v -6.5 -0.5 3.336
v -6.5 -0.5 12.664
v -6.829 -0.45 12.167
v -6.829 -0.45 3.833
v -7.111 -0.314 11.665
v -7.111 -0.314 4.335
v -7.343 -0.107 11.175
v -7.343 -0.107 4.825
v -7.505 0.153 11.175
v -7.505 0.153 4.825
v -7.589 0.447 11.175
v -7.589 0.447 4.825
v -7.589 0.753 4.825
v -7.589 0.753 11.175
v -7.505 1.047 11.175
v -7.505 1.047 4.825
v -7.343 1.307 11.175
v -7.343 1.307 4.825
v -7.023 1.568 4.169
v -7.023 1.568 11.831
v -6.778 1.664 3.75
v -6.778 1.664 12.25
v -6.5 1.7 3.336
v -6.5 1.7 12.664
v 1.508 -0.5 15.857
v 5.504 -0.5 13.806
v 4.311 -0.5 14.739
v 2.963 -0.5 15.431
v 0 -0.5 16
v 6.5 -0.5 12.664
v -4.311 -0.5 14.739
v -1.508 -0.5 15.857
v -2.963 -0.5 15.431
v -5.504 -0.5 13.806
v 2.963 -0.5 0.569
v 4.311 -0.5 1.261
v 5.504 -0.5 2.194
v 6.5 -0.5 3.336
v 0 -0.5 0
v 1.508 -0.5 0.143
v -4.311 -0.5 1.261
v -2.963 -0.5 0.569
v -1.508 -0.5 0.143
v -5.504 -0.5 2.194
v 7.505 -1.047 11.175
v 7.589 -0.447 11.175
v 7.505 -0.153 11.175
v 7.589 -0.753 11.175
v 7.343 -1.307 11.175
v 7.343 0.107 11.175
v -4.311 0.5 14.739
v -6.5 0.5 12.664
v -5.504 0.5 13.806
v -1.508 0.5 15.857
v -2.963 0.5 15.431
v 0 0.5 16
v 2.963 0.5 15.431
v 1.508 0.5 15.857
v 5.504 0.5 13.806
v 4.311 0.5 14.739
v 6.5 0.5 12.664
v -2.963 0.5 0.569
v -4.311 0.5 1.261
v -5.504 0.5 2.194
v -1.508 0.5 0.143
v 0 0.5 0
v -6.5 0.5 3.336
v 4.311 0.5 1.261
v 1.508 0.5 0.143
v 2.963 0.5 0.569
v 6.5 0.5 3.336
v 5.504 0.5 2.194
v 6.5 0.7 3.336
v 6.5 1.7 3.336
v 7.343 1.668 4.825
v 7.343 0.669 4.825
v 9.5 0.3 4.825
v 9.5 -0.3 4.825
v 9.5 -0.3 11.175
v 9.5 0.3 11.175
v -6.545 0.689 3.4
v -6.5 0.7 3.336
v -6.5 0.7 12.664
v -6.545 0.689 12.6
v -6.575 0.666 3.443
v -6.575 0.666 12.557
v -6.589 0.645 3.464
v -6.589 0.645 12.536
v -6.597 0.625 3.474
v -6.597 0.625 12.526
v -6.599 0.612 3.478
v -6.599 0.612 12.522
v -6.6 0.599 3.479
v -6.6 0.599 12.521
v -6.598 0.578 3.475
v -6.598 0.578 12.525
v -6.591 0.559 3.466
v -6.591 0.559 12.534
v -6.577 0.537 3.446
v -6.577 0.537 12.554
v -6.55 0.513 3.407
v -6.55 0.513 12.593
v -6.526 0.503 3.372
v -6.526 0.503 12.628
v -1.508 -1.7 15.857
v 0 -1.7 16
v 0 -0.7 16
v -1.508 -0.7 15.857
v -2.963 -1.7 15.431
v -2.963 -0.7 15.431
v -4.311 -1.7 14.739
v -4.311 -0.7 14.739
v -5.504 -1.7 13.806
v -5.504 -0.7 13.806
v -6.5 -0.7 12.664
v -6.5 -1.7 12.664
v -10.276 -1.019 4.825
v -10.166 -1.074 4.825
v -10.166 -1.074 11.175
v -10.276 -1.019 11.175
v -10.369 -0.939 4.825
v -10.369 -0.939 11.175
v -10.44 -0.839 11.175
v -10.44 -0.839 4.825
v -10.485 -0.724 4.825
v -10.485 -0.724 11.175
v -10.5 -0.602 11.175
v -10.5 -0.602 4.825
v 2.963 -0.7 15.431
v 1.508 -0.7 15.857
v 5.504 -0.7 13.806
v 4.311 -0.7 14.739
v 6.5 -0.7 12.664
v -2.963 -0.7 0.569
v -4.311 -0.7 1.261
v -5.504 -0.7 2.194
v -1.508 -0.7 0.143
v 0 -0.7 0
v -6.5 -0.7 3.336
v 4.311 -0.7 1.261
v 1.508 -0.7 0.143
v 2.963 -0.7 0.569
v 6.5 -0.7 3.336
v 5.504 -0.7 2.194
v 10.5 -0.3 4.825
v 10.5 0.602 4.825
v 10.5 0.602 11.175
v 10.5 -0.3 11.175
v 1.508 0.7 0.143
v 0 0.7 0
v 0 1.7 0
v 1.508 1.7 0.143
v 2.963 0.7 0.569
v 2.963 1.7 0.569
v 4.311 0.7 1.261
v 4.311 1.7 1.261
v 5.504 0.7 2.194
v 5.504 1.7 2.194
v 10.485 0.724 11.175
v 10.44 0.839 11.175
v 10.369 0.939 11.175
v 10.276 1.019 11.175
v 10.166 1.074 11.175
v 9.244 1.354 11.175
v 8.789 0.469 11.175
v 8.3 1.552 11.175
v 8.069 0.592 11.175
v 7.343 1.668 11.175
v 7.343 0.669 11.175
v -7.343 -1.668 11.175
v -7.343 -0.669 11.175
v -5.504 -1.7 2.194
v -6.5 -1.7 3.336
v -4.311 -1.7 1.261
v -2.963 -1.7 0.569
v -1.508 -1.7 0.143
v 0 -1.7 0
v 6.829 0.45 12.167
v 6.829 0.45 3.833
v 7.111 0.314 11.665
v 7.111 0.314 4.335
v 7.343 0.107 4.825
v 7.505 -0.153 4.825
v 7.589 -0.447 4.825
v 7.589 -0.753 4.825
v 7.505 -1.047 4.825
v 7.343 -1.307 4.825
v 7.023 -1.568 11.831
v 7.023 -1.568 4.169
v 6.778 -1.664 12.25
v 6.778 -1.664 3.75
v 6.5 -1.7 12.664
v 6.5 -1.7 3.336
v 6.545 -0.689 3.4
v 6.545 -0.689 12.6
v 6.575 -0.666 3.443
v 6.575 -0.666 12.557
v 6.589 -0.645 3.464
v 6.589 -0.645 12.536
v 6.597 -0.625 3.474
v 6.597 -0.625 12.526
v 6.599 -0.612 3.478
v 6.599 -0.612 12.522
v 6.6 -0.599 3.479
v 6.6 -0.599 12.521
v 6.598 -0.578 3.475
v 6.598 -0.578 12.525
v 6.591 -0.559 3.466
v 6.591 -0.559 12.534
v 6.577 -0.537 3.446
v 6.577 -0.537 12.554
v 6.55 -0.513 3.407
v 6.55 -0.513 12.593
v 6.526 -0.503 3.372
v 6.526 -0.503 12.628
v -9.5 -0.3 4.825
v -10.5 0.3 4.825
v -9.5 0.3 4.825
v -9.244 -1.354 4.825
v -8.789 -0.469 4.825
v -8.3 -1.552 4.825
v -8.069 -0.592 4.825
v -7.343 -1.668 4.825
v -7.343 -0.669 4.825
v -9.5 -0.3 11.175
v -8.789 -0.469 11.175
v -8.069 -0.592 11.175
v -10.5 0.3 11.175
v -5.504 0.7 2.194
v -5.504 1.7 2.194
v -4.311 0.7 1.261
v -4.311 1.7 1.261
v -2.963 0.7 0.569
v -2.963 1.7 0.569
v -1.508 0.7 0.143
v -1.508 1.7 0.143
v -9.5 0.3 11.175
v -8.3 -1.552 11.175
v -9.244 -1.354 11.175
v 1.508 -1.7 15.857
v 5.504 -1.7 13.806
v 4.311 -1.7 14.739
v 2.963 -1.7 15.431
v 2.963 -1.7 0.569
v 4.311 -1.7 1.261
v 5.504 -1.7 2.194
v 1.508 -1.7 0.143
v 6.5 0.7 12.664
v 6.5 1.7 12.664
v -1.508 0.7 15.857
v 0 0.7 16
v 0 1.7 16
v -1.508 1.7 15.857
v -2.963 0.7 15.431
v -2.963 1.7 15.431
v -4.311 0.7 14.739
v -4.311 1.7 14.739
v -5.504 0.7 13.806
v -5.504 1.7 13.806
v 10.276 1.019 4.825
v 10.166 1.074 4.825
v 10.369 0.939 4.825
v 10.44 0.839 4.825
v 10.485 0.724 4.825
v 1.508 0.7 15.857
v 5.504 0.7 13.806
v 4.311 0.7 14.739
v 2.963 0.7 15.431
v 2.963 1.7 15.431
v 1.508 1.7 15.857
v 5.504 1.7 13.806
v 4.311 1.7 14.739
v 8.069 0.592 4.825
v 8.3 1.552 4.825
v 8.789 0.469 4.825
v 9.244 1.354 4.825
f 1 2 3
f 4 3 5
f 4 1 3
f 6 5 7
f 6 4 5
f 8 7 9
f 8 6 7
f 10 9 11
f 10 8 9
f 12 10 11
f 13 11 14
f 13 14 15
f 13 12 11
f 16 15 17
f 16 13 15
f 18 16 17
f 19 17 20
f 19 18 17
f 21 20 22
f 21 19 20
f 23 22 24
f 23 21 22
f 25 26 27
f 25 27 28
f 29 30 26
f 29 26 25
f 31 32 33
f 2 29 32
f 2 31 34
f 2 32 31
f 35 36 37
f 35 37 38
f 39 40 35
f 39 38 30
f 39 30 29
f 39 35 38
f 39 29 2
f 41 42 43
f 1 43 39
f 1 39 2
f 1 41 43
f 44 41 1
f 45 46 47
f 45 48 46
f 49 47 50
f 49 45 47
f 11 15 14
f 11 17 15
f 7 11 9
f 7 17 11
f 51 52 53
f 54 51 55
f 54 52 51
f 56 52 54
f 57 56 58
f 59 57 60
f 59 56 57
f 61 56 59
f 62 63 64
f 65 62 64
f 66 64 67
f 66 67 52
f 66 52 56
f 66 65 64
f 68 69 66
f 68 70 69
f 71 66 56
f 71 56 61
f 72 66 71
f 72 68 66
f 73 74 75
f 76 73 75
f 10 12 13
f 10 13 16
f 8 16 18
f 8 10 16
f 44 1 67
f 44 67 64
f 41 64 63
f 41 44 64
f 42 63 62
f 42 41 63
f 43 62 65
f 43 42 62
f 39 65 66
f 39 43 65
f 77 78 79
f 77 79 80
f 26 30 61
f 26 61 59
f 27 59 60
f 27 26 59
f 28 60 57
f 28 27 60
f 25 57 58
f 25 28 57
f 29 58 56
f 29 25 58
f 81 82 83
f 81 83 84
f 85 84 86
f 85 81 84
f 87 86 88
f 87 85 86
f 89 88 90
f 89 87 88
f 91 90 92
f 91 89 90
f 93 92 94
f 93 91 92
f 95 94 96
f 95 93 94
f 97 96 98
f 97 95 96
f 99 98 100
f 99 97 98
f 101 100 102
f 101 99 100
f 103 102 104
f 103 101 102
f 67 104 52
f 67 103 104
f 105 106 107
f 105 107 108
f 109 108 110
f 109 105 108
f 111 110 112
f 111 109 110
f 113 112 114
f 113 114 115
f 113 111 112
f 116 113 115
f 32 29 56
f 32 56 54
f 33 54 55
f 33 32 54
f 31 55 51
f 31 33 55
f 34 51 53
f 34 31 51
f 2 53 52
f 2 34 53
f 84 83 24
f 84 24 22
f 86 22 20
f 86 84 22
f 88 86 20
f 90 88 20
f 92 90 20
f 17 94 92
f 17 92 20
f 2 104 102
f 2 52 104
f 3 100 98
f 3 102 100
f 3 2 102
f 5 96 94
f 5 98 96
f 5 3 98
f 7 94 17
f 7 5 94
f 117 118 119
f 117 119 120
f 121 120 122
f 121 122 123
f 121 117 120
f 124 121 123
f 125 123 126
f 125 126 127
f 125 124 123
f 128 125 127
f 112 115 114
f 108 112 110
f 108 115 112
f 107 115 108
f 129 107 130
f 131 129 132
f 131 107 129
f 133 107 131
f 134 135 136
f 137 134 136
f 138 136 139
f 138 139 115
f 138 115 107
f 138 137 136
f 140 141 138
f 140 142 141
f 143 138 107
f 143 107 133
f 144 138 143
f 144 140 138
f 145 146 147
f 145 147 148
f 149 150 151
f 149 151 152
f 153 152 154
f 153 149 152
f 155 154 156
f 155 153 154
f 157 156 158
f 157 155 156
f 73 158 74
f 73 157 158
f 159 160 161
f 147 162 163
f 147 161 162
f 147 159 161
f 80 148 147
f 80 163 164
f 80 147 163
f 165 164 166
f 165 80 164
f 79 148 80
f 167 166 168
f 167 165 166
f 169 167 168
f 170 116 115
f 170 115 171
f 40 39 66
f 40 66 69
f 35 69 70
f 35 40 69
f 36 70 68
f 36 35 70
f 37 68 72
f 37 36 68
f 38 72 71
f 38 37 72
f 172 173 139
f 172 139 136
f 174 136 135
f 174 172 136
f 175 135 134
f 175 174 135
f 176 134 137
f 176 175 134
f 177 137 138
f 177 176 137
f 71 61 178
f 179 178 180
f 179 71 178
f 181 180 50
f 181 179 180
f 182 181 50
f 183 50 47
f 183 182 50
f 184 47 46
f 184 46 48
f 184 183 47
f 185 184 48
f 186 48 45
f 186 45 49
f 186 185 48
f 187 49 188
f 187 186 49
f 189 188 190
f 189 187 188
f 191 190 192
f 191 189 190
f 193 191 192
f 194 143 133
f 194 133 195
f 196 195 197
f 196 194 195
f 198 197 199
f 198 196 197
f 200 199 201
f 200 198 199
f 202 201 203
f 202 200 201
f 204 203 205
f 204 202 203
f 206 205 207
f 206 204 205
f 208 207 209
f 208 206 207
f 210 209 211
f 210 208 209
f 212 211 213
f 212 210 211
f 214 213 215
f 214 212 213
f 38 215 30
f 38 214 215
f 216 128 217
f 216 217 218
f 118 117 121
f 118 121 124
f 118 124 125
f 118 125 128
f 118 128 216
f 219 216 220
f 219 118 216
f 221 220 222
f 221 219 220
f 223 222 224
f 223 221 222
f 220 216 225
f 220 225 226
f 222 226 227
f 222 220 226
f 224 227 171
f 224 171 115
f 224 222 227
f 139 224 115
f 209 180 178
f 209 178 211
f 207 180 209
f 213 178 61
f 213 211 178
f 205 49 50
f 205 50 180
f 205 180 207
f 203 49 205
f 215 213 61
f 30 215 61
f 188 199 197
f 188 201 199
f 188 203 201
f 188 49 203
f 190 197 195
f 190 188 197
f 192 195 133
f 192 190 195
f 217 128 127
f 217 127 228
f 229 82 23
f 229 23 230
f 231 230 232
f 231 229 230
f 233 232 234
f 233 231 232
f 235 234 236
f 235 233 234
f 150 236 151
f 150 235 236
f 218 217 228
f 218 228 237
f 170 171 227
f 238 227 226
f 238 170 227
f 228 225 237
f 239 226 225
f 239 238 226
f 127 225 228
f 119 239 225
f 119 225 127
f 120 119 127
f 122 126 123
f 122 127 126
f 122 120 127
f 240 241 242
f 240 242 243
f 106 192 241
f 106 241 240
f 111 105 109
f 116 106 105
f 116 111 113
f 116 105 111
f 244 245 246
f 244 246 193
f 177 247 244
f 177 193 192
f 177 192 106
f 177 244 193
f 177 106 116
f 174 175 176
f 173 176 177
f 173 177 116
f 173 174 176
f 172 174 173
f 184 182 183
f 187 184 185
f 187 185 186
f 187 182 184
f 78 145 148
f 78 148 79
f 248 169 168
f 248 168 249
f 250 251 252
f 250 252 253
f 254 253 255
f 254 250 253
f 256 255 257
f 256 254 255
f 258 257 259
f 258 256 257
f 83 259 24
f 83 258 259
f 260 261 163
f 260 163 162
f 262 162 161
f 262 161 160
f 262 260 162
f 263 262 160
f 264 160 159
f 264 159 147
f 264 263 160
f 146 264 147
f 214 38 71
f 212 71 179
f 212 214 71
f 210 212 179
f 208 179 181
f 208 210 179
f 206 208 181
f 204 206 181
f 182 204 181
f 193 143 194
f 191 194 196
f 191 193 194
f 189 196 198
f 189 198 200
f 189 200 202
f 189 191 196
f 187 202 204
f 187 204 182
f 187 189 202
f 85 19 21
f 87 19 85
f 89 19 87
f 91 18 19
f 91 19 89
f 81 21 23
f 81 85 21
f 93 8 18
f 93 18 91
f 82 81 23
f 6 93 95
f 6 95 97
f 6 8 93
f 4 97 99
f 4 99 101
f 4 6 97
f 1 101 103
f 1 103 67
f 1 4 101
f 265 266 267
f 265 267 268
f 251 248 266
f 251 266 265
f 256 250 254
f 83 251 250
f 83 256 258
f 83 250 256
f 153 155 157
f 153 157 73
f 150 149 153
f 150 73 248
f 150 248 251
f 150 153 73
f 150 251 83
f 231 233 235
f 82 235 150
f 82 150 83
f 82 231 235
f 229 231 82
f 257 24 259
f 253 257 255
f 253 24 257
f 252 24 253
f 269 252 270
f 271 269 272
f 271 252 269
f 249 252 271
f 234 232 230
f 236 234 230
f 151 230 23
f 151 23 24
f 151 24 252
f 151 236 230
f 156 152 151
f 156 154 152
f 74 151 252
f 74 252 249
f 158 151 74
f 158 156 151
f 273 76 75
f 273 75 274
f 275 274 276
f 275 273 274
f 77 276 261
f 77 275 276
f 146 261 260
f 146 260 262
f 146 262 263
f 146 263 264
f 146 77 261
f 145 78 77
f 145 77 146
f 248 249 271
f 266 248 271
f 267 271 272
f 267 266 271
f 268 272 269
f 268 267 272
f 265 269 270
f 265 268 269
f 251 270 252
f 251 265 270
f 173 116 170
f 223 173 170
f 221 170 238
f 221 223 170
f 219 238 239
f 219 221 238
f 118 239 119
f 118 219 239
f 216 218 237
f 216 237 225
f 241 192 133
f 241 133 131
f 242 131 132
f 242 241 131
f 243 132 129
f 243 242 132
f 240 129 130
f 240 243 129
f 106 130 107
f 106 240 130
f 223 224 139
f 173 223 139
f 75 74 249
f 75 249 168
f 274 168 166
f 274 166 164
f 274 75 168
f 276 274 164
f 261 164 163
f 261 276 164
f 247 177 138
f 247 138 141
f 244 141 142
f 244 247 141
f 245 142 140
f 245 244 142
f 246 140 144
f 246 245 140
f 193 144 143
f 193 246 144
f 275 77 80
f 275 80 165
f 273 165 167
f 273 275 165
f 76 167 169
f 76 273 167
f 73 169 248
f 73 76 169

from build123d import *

# Parameters (mm, degrees)
BOSS_EXTRUDE1_DEPTH     = 16
CUT_EXTRUDE2_DEPTH      = 16
CUT_EXTRUDE2_DEPTH_BACK = 16
SKETCH2_R               = 16.202009592


with BuildPart() as part:
    # Sketch1 → Boss-Extrude1 (new body)
    with BuildSketch(Plane.XY):
        with BuildLine():
            Line((-6.5, -1.7), (6.5, -1.7))
            ThreePointArc((6.5, -1.7), (7.6, -0.6), (6.5, 0.5))
            Line((6.5, 0.5), (-6.5, 0.5))
            ThreePointArc((-6.5, 0.5), (-6.6, 0.6), (-6.5, 0.7))
            Line((-6.5, 0.7), (6.5, 0.7))
            ThreePointArc((6.5, 0.7), (8.013274595, 0.599559463), (9.5, 0.3))
            Line((9.5, 0.3), (9.5, -0.3))
            Line((9.5, -0.3), (10.5, -0.3))
            Line((10.5, -0.3), (10.5, 0.602011532))
            ThreePointArc((10.5, 0.602011532), (10.408046537, 0.890971778), (10.166007905, 1.073648442))
            ThreePointArc((10.166007905, 1.073648442), (8.359565153, 1.542285751), (6.5, 1.7))
            Line((6.5, 1.7), (-6.5, 1.7))
            ThreePointArc((-6.5, 1.7), (-7.6, 0.6), (-6.5, -0.5))
            Line((-6.5, -0.5), (6.5, -0.5))
            ThreePointArc((6.5, -0.5), (6.6, -0.6), (6.5, -0.7))
            Line((6.5, -0.7), (-6.5, -0.7))
            ThreePointArc((-6.5, -0.7), (-8.013274595, -0.599559463), (-9.5, -0.3))
            Line((-9.5, -0.3), (-9.5, 0.3))
            Line((-9.5, 0.3), (-10.5, 0.3))
            Line((-10.5, 0.3), (-10.5, -0.602011532))
            ThreePointArc((-10.5, -0.602011532), (-10.408046537, -0.890971778), (-10.166007905, -1.073648442))
            ThreePointArc((-10.166007905, -1.073648442), (-8.359565153, -1.542285751), (-6.5, -1.7))
        make_face()
    extrude(amount=BOSS_EXTRUDE1_DEPTH)

    # Sketch2 → Cut-Extrude2 (cut, two sides: drawn at the far end of the back side and taken through both)
    with BuildSketch(Plane(origin=(0, 1.7, 0), x_dir=(1, 0, 0), z_dir=(0, 1, 0)).offset(-CUT_EXTRUDE2_DEPTH_BACK)):
        with Locations((0, -8)):
            Circle(SKETCH2_R)
        with BuildLine():
            Line((-7.342981343, -11.175), (-10.5, -11.175))
            Line((-10.5, -11.175), (-10.5, -4.825))
            Line((-10.5, -4.825), (-7.342981343, -4.825))
            ThreePointArc((-7.342981343, -4.825), (0, 0), (7.342981343, -4.825))
            Line((7.342981343, -4.825), (10.5, -4.825))
            Line((10.5, -4.825), (10.5, -11.175))
            Line((10.5, -11.175), (7.342981343, -11.175))
            ThreePointArc((7.342981343, -11.175), (0, -16), (-7.342981343, -11.175))
        make_face(mode=Mode.SUBTRACT)
    extrude(amount=CUT_EXTRUDE2_DEPTH + CUT_EXTRUDE2_DEPTH_BACK, mode=Mode.SUBTRACT)


solid = part.part
